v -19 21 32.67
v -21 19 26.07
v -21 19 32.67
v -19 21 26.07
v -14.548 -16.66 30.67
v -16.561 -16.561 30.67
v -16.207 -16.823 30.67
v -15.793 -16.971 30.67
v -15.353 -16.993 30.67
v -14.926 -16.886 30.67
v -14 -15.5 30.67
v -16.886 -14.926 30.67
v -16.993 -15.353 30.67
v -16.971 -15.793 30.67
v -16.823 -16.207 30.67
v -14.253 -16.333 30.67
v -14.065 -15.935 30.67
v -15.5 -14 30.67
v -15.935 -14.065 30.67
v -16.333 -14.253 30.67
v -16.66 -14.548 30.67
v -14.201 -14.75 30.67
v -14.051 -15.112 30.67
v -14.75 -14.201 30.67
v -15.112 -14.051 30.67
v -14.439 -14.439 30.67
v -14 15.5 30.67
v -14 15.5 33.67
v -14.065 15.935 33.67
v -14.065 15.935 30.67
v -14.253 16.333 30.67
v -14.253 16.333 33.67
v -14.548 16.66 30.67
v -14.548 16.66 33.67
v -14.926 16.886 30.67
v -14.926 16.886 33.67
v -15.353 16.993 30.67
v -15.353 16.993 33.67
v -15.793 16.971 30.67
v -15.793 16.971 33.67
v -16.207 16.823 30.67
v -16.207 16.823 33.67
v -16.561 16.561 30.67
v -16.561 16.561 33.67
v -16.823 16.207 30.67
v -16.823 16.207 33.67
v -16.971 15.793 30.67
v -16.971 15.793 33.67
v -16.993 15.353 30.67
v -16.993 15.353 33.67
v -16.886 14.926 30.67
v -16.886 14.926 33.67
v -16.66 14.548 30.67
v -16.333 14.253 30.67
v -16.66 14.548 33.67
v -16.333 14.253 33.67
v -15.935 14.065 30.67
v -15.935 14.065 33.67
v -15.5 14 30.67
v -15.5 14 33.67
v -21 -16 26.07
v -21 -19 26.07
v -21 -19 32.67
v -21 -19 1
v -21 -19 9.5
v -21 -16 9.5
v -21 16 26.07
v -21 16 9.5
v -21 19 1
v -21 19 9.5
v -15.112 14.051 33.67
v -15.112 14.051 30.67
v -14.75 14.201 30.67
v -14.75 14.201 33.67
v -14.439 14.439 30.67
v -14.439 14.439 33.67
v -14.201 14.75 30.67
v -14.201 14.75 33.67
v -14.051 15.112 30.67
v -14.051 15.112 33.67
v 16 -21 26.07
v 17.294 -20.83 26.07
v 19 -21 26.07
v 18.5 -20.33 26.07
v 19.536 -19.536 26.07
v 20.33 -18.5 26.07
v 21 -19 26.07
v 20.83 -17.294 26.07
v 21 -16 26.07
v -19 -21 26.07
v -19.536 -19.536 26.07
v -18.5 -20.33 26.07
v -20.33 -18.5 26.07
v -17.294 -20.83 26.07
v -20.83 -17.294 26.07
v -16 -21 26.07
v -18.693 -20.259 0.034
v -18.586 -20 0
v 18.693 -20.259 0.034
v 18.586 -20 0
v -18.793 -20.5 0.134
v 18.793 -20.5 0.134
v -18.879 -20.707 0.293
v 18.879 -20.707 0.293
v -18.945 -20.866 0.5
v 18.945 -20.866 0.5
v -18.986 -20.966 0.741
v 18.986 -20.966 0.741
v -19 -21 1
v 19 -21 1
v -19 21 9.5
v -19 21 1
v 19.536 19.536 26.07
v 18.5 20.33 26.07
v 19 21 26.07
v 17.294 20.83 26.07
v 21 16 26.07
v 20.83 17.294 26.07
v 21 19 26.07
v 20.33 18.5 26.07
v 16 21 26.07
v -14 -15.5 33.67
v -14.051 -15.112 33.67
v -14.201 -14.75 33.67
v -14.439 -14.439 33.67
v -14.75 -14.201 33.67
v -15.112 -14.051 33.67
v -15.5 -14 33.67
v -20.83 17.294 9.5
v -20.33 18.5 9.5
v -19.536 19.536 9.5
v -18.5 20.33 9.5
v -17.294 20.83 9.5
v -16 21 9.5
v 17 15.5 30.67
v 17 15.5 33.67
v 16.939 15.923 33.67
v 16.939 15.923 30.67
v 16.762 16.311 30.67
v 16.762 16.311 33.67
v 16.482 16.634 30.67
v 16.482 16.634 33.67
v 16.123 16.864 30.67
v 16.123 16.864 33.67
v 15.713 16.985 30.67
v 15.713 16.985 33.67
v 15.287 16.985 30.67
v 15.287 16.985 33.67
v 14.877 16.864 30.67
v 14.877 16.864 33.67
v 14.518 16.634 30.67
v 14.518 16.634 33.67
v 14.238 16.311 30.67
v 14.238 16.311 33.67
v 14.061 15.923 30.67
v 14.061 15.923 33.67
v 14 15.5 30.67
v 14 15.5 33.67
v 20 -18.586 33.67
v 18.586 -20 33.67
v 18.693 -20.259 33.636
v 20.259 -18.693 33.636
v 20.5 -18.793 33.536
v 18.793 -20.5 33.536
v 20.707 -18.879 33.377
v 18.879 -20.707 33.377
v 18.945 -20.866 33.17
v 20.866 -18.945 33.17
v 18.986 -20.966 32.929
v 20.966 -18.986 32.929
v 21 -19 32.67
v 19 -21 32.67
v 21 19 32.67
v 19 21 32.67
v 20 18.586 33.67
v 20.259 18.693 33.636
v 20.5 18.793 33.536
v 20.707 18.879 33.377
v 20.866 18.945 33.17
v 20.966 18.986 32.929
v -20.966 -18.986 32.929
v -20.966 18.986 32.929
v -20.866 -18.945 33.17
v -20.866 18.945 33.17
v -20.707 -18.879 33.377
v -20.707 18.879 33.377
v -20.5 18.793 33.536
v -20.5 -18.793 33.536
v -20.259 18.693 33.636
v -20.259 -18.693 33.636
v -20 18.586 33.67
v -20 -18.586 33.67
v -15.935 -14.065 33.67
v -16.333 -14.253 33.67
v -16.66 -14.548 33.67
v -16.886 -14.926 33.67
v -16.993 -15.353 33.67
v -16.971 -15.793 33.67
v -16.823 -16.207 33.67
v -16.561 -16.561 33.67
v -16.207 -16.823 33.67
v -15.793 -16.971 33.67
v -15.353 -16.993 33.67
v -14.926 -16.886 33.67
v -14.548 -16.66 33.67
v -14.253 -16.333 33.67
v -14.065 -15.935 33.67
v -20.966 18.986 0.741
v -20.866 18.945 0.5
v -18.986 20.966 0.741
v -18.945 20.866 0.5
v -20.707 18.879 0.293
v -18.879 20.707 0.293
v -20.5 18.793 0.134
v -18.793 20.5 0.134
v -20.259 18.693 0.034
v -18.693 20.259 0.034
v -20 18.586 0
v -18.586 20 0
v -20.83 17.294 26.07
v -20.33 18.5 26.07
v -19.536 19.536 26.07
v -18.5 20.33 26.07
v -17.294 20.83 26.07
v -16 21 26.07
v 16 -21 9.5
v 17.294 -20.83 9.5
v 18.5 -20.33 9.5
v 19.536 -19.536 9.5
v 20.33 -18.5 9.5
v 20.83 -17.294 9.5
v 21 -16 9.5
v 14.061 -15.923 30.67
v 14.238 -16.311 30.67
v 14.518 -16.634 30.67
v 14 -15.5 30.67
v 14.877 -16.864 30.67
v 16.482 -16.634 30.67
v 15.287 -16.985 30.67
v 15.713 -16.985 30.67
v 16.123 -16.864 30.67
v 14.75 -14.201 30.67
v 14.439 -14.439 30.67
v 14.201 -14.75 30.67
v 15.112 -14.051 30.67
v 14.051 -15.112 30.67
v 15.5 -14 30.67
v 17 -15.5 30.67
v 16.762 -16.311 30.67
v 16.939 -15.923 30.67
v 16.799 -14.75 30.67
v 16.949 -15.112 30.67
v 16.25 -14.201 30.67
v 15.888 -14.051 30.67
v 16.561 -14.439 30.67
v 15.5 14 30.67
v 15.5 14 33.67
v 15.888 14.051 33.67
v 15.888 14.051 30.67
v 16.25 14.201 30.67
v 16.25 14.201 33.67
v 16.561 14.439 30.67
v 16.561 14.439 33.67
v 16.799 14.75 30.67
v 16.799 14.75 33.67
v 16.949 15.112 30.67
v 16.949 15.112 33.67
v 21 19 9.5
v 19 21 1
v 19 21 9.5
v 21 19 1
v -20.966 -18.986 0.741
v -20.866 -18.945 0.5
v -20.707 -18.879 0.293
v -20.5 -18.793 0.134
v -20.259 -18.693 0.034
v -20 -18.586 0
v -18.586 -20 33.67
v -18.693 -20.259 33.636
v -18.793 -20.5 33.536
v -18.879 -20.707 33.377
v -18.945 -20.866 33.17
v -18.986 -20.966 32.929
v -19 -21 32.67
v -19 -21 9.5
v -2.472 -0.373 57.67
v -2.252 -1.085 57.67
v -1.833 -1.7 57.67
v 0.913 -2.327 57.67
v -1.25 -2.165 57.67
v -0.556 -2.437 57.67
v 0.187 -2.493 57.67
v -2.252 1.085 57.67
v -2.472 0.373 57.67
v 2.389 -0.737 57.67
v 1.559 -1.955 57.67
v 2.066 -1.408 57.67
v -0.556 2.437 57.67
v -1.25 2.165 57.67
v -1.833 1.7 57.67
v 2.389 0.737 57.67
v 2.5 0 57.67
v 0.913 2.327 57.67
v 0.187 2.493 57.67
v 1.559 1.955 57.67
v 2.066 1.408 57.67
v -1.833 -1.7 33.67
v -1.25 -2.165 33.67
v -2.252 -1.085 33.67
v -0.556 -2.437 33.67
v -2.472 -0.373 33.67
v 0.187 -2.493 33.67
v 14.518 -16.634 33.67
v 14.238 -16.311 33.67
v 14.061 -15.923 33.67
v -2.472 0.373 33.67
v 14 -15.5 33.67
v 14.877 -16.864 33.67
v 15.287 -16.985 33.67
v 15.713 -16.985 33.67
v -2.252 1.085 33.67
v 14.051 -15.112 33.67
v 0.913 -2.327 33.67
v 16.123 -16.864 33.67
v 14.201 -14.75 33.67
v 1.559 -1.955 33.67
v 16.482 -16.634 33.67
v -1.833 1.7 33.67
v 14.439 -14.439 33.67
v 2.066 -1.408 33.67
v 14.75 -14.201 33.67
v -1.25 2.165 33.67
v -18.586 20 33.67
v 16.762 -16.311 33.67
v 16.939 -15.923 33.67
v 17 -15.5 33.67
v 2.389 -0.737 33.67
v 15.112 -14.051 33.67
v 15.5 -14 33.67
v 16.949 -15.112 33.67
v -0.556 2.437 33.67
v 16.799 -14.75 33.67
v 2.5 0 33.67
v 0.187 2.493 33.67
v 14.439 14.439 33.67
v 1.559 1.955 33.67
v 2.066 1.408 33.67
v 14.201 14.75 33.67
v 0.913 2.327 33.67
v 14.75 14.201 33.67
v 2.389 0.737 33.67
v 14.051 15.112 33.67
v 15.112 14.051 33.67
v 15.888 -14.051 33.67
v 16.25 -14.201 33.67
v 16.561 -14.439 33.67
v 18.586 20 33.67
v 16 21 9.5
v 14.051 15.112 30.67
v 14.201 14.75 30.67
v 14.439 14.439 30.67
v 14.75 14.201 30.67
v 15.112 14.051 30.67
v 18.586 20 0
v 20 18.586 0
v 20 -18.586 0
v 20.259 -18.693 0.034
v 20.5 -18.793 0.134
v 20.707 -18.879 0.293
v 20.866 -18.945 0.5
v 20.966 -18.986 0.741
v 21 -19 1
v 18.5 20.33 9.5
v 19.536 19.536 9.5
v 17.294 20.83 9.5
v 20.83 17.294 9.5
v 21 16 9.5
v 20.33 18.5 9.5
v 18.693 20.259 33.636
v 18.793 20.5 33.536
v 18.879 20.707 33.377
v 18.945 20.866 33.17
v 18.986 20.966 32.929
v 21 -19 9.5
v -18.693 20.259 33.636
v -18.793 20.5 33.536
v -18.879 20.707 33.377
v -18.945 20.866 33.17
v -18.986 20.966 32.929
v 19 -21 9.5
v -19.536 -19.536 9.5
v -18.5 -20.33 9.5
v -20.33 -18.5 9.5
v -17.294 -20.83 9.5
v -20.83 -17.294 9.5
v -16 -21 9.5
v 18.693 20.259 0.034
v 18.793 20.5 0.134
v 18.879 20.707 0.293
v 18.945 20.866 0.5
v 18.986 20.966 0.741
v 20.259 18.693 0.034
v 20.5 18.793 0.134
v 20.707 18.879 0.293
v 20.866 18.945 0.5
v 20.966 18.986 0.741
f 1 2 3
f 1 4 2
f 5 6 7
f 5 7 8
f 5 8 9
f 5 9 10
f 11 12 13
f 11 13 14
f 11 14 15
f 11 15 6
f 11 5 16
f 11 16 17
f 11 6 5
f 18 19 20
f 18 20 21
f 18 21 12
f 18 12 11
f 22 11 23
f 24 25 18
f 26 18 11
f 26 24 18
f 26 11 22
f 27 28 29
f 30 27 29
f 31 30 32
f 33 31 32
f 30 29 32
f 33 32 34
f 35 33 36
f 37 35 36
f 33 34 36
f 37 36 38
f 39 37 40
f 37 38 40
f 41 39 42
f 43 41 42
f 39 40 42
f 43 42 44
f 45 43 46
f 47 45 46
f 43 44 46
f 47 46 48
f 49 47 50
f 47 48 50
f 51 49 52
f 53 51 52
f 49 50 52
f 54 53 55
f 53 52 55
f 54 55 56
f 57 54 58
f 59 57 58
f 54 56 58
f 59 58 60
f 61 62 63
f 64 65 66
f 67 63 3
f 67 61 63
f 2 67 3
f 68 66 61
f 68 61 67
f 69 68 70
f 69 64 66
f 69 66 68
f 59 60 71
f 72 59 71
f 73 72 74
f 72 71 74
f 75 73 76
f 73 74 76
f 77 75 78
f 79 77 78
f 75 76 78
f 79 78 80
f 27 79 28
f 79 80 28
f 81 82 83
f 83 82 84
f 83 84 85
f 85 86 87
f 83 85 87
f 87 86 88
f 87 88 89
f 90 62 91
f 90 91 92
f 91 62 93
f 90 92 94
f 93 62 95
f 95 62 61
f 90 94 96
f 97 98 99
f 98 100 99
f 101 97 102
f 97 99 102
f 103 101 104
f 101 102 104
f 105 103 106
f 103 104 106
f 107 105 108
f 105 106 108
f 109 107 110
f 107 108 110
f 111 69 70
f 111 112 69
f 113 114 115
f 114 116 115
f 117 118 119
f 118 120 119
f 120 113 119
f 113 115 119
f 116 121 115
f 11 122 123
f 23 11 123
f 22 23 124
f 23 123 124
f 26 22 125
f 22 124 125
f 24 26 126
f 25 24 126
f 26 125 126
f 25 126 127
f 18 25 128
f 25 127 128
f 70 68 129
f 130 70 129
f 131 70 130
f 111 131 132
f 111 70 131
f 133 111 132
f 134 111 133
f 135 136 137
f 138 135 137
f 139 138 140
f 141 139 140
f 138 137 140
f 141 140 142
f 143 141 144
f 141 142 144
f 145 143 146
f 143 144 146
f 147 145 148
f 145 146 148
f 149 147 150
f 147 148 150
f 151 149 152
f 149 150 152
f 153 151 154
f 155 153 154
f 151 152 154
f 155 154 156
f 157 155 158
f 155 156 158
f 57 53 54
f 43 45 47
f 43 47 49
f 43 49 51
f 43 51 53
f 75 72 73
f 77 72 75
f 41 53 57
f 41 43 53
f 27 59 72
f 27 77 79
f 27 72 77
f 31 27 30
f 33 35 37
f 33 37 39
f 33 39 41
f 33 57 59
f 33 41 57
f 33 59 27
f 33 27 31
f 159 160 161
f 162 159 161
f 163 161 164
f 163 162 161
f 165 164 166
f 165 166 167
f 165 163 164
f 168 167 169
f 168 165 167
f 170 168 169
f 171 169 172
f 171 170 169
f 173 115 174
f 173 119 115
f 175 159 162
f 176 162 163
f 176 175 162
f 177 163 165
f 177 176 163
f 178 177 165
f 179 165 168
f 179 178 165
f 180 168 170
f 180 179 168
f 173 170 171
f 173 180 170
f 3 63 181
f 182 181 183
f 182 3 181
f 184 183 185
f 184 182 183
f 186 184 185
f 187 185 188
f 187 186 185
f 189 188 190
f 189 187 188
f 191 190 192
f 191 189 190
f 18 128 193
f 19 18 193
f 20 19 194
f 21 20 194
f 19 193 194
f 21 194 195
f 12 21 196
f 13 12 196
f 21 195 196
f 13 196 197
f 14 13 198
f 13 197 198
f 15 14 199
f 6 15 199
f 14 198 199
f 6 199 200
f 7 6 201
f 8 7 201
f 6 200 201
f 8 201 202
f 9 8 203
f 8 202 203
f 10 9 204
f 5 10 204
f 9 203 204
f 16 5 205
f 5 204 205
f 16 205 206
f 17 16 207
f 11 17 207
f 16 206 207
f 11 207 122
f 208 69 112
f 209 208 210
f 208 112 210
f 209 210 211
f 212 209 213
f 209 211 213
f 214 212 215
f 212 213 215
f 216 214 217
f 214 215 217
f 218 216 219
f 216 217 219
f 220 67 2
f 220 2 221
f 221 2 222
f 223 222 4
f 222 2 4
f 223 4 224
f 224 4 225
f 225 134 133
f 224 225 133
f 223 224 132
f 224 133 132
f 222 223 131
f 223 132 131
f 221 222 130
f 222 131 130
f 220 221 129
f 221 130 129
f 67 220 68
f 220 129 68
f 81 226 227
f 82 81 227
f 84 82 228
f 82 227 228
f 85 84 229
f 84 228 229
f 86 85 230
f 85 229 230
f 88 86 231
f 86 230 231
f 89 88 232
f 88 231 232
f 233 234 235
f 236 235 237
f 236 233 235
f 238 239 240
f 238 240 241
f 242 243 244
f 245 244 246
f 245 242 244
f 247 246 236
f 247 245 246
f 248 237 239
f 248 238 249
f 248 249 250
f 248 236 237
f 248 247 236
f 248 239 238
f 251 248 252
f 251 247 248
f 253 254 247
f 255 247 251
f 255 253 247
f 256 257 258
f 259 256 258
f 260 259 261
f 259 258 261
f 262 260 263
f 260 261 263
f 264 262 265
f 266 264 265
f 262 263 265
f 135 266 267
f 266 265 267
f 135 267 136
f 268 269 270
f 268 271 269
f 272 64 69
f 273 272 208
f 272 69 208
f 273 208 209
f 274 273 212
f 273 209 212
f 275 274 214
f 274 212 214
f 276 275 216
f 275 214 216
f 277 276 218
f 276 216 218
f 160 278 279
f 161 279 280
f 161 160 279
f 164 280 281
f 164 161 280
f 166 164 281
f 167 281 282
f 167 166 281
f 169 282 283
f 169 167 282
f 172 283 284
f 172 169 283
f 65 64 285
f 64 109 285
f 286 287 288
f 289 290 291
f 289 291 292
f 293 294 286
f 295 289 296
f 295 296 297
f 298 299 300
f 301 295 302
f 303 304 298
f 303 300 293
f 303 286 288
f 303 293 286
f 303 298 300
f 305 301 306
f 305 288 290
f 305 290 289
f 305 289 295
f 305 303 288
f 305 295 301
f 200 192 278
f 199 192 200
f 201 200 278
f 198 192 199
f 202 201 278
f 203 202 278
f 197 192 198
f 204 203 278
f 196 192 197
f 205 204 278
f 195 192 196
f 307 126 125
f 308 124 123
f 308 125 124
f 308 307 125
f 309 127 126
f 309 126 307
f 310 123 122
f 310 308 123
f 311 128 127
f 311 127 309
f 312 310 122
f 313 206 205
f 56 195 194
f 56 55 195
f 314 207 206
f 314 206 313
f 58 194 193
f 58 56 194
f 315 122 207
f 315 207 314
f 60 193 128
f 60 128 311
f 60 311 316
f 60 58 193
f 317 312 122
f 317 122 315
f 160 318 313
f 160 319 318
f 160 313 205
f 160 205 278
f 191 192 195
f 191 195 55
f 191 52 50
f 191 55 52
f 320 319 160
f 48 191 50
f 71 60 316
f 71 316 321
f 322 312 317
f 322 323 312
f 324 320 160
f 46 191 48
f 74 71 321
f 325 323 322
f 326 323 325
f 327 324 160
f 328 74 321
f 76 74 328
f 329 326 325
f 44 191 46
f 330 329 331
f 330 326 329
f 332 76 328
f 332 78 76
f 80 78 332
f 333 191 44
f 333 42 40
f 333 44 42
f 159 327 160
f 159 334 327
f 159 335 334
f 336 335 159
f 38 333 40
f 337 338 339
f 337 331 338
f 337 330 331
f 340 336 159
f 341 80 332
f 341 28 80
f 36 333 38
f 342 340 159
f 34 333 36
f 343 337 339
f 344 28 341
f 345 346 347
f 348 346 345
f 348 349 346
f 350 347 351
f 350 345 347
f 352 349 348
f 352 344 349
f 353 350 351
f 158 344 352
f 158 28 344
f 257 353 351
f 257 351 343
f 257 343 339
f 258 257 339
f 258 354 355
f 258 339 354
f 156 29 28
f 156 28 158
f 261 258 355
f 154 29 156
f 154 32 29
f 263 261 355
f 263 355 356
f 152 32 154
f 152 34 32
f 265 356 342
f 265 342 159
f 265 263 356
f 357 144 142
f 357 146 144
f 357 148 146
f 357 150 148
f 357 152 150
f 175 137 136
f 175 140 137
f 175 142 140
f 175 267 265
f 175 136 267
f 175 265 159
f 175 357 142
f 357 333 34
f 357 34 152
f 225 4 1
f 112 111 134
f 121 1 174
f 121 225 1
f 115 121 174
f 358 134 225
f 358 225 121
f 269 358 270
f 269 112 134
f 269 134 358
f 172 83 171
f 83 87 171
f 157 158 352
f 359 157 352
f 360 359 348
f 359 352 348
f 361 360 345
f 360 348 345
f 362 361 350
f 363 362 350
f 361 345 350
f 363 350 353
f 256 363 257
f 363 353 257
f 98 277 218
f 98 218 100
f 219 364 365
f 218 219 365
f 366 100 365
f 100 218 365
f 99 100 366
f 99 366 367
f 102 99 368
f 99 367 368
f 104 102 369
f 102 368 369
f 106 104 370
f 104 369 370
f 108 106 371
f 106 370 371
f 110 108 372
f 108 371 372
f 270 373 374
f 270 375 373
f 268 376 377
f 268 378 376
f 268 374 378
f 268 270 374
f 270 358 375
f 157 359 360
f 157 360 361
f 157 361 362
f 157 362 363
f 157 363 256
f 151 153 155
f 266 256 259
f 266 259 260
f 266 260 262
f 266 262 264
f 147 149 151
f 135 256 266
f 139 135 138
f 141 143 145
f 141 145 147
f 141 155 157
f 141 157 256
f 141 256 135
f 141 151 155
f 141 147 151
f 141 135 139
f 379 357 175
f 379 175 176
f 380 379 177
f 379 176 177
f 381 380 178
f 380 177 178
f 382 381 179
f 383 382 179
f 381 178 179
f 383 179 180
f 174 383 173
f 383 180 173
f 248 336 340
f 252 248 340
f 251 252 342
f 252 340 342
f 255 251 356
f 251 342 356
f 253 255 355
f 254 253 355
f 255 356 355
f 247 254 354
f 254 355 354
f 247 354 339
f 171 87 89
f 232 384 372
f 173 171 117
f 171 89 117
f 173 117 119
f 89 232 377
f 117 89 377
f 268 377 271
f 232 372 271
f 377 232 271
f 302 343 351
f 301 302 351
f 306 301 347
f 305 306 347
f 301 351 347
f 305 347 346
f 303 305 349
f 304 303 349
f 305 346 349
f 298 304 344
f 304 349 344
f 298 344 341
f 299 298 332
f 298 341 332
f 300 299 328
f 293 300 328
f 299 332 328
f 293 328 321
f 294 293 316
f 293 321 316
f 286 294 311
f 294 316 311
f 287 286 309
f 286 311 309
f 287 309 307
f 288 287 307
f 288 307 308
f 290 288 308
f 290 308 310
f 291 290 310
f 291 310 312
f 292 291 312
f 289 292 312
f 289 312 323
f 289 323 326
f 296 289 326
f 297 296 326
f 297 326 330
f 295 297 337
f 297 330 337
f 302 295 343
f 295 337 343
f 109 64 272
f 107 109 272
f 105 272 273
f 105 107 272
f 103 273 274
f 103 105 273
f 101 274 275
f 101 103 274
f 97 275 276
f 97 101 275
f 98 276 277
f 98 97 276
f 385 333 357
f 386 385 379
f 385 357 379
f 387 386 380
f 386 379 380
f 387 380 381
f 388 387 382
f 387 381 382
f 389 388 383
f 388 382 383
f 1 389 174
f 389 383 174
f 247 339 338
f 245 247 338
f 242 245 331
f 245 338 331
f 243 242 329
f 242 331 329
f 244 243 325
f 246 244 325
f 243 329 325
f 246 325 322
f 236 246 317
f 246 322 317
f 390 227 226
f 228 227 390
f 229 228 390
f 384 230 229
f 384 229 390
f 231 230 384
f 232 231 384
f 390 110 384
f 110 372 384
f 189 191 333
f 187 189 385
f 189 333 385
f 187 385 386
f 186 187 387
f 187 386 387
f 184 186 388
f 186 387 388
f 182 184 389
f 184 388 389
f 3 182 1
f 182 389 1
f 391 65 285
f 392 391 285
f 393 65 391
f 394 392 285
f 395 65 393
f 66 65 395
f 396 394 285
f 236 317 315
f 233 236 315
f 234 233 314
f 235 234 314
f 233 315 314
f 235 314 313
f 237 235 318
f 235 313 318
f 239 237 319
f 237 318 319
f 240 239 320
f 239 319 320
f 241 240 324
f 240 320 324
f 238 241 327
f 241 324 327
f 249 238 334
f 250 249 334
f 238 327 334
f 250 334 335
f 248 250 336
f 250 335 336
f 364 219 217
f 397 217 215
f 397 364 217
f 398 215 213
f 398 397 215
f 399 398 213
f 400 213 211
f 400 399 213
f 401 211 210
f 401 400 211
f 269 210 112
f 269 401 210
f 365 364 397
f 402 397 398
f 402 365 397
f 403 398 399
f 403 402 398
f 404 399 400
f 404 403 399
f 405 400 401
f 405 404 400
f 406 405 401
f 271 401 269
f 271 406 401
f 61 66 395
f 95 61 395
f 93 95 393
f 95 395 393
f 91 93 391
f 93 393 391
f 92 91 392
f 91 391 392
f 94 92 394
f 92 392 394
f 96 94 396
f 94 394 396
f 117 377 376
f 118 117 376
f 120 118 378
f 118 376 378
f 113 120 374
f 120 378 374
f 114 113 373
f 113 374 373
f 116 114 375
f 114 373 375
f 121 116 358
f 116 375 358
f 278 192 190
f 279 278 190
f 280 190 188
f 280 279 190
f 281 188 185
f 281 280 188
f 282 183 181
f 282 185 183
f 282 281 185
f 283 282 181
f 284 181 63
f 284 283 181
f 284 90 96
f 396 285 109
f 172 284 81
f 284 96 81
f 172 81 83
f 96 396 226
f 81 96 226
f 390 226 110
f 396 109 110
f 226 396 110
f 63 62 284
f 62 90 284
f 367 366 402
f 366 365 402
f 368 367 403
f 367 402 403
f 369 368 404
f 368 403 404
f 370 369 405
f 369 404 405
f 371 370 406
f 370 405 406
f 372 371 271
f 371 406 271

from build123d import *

# Parameters (mm, degrees)
F0_W     = 42
F0_H     = 42
F1_DEPTH = 9.5
F3_DEPTH = 16.57
F4_W     = 42
F4_H     = 42
F5_DEPTH = 7.6
F7_DEPTH = 3
F8_R     = 2.5
F9_DEPTH = 24
F10_SIZE = 2
F11_R    = 1


with BuildPart() as f1:
    # F0 (on Top) → F1 (new body)
    with BuildSketch(Plane.XY):
        Rectangle(F0_W, F0_H)
    extrude(amount=F1_DEPTH)

    # F2 (on face) → F3 (join)
    with BuildSketch(Plane.XY.offset(9.5)):
        with BuildLine():
            Line((-16, -21), (16, -21))
            ThreePointArc((16, -21), (19.5355339059, -19.5355339059), (21, -16))
            Line((21, -16), (21, 16))
            ThreePointArc((21, 16), (19.5355339059, 19.5355339059), (16, 21))
            Line((16, 21), (-16, 21))
            ThreePointArc((-16, 21), (-19.5355339059, 19.5355339059), (-21, 16))
            Line((-21, 16), (-21, -16))
            ThreePointArc((-21, -16), (-19.5355339059, -19.5355339059), (-16, -21))
        make_face()
    extrude(amount=F3_DEPTH)

    # F4 (on face) → F5 (join)
    with BuildSketch(Plane.XY.offset(26.07)):
        Rectangle(F4_W, F4_H)
    extrude(amount=F5_DEPTH)

    # F6 (on face) → F7 (cut)
    with BuildSketch(Plane.XY.offset(33.67)):
        with BuildLine():
            Line((15.5, -14), (15.5, -15.5))
            Line((15.5, -15.5), (14, -15.5))
            ThreePointArc((14, -15.5), (15.5, -17), (17, -15.5))
            ThreePointArc((17, -15.5), (16.5606601718, -14.4393398282), (15.5, -14))
        make_face()
        with BuildLine():
            Line((14, -15.5), (15.5, -15.5))
            Line((15.5, -15.5), (15.5, -14))
            ThreePointArc((15.5, -14), (14.4393398282, -14.4393398282), (14, -15.5))
        make_face()
        with BuildLine():
            Line((15.5, 14), (15.5, 15.5))
            Line((15.5, 15.5), (14, 15.5))
            ThreePointArc((14, 15.5), (14.4393398282, 14.4393398282), (15.5, 14))
        make_face()
        with BuildLine():
            Line((14, 15.5), (15.5, 15.5))
            Line((15.5, 15.5), (15.5, 14))
            ThreePointArc((15.5, 14), (16.5606601718, 14.4393398282), (17, 15.5))
            ThreePointArc((17, 15.5), (15.5, 17), (14, 15.5))
        make_face()
        with BuildLine():
            Line((-14, -15.5), (-15.5, -15.5))
            Line((-15.5, -15.5), (-15.5, -14))
            ThreePointArc((-15.5, -14), (-16.5606601718, -16.5606601718), (-14, -15.5))
        make_face()
        with BuildLine():
            Line((-15.5, -14), (-15.5, -15.5))
            Line((-15.5, -15.5), (-14, -15.5))
            ThreePointArc((-14, -15.5), (-14.4393398282, -14.4393398282), (-15.5, -14))
        make_face()
        with BuildLine():
            Line((-15.5, 15.5), (-14, 15.5))
            ThreePointArc((-14, 15.5), (-16.5606601718, 16.5606601718), (-15.5, 14))
            Line((-15.5, 14), (-15.5, 15.5))
        make_face()
        with BuildLine():
            ThreePointArc((-15.5, 14), (-14.4393398282, 14.4393398282), (-14, 15.5))
            Line((-14, 15.5), (-15.5, 15.5))
            Line((-15.5, 15.5), (-15.5, 14))
        make_face()
    extrude(amount=-F7_DEPTH, mode=Mode.SUBTRACT)

    # F8 (on face) → F9 (join)
    with BuildSketch(Plane.XY.offset(33.67)):
        Circle(F8_R)
    extrude(amount=F9_DEPTH)

    # F10
    f10_edges = [f1.edges().sort_by_distance(p)[0] for p in [
        (21, 21, 29.87),
        (21, 21, 4.75),
        (-21, 21, 29.87),
        (-21, 21, 4.75),
        (-21, -21, 29.87),
        (-21, -21, 4.75),
        (21, -21, 4.75),
        (21, -21, 29.87),
    ]]
    chamfer(f10_edges, length=F10_SIZE)

    # F11
    f11_edges = [f1.edges().sort_by_distance(p)[0] for p in [
        (0, 21, 33.67),
        (-20, 20, 33.67),
        (-21, 0, 33.67),
        (-20, -20, 33.67),
        (0, -21, 33.67),
        (20, -20, 33.67),
        (21, 0, 33.67),
        (20, 20, 33.67),
        (0, 21, 0),
        (21, 0, 0),
        (20, 20, 0),
        (-21, 0, 0),
        (-20, 20, 0),
        (0, -21, 0),
        (20, -20, 0),
        (-20, -20, 0),
    ]]
    fillet(f11_edges, radius=F11_R)


solid = f1.part
